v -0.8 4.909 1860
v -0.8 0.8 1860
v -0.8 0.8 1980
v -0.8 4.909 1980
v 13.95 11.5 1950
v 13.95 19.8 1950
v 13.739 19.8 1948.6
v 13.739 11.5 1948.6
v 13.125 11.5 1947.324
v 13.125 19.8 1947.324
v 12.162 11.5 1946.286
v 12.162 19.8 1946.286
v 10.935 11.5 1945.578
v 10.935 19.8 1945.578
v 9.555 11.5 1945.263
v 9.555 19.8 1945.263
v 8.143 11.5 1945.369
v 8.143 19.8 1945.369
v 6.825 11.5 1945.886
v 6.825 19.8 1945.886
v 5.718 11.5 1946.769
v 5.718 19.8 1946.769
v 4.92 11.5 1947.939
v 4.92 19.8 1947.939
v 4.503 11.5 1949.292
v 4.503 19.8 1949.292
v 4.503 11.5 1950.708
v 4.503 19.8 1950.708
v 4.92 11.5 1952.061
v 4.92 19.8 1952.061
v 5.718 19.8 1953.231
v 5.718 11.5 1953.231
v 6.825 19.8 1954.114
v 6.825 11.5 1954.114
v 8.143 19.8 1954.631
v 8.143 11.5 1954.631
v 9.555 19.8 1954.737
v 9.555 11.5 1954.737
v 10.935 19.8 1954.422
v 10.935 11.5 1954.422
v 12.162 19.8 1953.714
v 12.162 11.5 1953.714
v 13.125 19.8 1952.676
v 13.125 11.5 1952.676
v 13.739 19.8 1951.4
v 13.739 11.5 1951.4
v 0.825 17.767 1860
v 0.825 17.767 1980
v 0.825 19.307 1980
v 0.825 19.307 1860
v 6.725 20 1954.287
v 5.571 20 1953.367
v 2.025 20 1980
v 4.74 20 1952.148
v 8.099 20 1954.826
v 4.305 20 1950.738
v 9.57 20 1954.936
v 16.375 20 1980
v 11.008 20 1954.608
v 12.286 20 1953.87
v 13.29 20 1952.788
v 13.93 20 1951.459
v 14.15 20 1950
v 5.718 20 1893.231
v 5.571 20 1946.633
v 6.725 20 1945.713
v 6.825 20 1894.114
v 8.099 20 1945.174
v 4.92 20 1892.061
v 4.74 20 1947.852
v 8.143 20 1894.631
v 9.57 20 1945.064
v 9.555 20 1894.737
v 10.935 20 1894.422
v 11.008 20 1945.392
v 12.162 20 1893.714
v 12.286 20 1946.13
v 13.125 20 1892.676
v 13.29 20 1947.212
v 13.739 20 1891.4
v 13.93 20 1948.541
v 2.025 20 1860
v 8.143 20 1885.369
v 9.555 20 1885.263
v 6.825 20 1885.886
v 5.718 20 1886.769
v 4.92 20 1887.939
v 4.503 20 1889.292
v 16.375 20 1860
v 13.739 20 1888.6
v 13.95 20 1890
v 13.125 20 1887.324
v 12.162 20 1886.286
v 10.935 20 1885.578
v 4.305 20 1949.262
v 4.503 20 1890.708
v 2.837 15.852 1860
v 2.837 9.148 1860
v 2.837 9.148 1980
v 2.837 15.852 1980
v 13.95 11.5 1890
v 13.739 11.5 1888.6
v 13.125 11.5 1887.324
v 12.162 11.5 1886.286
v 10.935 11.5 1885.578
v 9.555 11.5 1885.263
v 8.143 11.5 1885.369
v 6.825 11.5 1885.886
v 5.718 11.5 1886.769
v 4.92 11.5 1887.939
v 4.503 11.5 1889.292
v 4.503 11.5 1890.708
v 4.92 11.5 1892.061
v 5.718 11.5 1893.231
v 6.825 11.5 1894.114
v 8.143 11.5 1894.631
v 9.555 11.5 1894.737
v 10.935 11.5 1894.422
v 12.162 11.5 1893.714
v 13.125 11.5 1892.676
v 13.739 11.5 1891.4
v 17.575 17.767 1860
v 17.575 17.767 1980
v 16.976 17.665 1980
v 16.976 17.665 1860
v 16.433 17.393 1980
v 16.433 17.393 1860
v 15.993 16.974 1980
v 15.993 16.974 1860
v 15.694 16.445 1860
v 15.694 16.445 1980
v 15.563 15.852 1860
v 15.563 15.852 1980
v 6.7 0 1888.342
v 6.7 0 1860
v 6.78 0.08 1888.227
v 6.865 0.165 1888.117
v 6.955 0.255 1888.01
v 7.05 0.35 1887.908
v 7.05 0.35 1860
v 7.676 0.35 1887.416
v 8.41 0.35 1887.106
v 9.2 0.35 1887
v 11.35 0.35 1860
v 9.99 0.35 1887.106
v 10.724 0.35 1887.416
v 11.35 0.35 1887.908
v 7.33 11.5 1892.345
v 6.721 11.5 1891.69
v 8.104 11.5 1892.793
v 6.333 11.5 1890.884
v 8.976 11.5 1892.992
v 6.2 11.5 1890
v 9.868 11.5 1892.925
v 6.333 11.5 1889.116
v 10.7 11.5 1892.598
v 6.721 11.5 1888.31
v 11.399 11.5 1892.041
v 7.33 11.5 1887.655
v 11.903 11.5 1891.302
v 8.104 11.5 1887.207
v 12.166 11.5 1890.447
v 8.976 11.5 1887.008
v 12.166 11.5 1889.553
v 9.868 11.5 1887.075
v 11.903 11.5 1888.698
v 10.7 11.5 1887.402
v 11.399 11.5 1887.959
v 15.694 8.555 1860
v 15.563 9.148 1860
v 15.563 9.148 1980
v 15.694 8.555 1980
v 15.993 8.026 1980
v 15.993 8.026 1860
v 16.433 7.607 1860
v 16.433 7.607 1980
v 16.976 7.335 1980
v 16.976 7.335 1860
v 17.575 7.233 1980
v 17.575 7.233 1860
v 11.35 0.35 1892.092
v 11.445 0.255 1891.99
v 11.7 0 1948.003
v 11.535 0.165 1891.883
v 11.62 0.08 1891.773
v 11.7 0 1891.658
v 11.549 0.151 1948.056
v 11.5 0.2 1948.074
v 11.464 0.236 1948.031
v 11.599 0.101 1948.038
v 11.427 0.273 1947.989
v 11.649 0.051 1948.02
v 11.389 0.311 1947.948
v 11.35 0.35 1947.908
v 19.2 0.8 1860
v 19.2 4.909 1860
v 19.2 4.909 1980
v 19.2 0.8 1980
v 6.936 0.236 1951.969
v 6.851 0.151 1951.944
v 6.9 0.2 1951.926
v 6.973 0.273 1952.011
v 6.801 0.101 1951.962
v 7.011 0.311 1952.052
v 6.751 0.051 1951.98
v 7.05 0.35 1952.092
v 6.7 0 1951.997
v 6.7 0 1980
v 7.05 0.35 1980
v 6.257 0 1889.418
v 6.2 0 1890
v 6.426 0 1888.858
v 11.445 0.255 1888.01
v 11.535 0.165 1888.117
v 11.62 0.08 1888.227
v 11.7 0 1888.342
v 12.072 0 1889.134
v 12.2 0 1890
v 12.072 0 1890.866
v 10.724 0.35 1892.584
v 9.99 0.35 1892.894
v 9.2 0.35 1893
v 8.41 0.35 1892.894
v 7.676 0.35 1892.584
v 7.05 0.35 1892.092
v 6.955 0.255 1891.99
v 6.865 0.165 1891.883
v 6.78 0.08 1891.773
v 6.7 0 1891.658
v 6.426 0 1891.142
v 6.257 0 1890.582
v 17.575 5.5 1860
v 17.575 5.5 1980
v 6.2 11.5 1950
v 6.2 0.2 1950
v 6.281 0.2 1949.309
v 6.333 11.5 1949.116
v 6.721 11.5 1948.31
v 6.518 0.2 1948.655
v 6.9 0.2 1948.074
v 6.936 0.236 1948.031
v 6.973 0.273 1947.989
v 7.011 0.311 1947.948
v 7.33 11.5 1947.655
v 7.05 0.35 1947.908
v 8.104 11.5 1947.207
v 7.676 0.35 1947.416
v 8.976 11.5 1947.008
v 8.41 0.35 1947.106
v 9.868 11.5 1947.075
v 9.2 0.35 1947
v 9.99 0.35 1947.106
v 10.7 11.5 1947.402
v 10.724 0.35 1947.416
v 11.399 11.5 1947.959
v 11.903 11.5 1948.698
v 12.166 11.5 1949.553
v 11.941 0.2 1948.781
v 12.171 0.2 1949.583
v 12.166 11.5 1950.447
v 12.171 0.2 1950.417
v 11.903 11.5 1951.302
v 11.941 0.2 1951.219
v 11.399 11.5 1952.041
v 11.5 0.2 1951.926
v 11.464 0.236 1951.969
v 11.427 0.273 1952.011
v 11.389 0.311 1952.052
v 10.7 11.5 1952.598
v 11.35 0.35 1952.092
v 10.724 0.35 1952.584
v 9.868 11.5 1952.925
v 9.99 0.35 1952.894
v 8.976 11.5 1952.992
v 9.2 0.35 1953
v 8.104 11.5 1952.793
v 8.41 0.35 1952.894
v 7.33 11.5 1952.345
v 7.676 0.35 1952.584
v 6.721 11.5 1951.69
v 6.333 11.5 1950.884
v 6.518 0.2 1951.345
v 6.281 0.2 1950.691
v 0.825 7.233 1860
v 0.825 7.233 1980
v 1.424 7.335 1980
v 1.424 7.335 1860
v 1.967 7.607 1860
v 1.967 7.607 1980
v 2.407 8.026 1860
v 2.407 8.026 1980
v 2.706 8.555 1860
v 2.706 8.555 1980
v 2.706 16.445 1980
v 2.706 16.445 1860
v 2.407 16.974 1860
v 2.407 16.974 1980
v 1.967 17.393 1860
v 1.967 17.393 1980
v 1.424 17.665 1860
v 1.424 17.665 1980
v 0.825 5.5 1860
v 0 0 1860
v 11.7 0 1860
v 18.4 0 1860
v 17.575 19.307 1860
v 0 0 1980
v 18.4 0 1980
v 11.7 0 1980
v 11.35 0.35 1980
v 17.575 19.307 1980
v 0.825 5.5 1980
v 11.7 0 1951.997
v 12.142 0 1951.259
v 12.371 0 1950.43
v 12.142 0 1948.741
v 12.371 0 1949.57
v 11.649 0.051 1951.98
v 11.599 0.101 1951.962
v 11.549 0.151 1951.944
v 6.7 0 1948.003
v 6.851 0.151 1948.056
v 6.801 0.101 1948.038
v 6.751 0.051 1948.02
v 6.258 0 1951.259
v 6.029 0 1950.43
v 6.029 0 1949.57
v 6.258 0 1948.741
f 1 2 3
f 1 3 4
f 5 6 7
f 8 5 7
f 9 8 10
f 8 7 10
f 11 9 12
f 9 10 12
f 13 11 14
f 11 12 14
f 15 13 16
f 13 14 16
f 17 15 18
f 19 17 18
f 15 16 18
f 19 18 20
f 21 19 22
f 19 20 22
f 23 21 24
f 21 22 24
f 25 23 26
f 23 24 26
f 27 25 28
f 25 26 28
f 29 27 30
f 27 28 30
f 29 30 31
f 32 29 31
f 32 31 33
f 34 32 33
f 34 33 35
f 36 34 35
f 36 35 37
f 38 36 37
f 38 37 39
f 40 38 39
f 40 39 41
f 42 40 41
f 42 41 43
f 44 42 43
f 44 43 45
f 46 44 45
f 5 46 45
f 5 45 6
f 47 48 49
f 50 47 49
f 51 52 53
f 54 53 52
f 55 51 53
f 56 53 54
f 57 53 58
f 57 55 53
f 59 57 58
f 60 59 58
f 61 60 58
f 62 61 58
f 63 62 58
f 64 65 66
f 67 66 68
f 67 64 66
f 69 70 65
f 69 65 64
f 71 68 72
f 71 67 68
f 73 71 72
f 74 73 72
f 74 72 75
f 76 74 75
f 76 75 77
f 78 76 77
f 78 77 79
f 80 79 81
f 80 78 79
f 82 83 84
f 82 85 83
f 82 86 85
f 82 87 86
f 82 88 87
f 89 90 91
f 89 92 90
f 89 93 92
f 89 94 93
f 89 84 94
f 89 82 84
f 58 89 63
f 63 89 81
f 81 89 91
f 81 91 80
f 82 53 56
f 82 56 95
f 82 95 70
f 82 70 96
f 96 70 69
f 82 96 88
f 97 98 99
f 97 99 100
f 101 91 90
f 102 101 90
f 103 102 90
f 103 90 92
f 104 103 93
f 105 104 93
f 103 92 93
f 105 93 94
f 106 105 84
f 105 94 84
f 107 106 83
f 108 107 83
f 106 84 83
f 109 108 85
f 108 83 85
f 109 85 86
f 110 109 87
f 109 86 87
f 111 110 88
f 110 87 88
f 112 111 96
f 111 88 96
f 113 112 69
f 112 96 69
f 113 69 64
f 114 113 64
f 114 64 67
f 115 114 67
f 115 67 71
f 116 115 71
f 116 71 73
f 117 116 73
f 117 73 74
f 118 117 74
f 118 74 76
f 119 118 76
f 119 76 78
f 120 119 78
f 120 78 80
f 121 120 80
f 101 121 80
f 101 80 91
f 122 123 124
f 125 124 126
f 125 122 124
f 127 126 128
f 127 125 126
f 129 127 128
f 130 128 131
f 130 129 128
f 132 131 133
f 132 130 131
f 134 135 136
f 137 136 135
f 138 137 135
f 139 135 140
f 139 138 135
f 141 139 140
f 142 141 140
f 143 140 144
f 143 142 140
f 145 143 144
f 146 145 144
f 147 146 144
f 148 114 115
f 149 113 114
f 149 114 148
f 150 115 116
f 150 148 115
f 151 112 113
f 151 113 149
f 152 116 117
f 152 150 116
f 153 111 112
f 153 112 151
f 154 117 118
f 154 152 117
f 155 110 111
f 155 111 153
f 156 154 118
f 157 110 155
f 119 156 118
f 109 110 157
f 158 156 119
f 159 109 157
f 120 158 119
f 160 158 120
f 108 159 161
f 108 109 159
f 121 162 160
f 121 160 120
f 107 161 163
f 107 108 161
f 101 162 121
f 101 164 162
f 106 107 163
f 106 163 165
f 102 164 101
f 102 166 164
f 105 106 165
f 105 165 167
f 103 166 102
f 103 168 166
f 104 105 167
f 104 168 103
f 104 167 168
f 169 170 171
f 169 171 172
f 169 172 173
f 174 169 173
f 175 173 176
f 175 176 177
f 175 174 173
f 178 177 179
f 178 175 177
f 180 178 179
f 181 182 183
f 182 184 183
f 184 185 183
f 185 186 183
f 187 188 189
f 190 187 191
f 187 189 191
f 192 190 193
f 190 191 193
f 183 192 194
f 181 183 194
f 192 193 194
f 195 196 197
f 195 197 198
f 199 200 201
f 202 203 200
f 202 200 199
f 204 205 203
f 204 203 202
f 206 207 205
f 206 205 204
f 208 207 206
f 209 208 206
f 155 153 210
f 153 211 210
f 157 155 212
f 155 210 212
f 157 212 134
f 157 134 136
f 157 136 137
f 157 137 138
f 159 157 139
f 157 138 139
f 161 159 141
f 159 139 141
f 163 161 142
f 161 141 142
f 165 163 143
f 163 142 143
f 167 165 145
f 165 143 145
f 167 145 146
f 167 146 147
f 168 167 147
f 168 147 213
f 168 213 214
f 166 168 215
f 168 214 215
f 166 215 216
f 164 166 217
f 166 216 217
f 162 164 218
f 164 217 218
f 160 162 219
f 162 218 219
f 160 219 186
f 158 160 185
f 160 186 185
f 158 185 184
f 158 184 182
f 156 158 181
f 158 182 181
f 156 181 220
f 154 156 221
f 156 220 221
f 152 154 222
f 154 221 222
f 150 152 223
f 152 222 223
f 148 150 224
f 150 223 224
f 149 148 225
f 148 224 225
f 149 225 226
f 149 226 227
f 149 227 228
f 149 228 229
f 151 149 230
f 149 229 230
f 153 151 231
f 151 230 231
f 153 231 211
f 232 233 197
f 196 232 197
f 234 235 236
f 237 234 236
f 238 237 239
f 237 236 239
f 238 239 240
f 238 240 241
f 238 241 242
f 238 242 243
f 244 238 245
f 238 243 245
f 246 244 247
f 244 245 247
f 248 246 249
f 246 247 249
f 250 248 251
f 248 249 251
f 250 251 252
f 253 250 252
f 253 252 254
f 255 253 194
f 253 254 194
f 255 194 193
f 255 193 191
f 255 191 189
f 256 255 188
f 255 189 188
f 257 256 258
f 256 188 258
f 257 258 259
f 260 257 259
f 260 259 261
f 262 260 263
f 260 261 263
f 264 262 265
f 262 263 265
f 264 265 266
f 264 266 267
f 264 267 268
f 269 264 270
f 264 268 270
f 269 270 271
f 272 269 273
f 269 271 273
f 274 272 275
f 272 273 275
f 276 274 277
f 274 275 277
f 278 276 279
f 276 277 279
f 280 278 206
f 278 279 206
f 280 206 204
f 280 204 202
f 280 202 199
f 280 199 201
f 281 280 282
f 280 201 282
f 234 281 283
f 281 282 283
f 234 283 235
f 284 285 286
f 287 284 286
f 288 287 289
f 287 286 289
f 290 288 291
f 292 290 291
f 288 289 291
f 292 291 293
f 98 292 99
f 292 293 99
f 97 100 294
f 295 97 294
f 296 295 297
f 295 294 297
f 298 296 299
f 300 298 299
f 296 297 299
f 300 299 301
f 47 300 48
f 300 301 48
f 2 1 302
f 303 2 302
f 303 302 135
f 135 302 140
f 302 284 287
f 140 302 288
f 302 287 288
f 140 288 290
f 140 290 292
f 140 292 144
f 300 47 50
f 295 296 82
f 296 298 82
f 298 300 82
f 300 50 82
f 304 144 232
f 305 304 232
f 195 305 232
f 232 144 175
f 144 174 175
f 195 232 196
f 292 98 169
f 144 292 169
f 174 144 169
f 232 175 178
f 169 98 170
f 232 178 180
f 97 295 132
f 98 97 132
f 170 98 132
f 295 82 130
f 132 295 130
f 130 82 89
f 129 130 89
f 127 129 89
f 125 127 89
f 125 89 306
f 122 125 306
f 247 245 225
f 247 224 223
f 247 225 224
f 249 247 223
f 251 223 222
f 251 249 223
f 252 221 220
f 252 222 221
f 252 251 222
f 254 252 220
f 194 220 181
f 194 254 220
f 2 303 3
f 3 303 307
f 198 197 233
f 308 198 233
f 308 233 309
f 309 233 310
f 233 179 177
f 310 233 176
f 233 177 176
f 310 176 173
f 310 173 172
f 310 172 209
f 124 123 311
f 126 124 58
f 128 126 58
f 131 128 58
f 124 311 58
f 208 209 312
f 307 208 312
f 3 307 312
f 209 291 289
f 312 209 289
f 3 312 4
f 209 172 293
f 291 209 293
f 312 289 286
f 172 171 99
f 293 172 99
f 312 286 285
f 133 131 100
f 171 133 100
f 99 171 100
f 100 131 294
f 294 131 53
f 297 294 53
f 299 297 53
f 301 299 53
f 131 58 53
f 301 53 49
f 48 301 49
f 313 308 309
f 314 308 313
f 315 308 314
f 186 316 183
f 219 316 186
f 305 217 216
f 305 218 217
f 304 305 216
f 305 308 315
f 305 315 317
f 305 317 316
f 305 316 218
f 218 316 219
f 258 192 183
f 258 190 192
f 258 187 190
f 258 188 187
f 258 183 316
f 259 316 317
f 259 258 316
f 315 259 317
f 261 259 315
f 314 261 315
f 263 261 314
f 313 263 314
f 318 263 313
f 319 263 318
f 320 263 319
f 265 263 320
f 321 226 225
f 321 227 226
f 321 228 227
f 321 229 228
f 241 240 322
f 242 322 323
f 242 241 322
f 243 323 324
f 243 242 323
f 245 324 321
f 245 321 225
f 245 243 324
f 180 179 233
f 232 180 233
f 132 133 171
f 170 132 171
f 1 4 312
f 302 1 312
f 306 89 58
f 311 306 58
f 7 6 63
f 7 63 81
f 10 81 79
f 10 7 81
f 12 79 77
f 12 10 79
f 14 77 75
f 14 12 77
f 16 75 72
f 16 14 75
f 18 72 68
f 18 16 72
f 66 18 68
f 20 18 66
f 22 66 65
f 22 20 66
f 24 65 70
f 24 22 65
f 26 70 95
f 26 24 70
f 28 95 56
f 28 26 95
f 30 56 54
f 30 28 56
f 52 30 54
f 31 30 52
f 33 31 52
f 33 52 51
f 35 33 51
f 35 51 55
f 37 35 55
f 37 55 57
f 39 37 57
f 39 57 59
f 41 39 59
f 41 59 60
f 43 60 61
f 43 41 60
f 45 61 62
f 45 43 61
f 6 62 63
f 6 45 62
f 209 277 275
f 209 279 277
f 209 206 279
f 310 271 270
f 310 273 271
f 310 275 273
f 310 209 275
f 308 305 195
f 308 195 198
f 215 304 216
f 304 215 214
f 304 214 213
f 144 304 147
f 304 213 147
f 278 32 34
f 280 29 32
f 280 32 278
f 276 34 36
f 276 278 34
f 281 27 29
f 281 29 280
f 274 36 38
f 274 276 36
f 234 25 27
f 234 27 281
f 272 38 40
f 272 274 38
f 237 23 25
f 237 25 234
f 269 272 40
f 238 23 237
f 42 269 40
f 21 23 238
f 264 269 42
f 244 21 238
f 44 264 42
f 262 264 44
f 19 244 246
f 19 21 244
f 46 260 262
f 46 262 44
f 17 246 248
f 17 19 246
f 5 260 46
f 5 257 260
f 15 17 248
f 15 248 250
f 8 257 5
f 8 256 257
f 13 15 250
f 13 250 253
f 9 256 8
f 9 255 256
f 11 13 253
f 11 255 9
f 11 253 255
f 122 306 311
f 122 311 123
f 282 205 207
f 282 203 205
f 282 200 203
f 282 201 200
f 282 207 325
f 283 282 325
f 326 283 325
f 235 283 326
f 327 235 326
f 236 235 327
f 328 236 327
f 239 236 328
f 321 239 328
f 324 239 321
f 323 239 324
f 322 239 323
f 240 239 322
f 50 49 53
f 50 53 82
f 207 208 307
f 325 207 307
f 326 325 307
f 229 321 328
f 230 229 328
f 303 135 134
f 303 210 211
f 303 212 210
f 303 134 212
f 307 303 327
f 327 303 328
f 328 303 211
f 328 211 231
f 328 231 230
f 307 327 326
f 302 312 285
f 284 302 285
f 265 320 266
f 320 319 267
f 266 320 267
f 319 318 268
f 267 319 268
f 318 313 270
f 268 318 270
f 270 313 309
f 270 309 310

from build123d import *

# Parameters (mm, degrees)
BOSS_EXTRU_1_DEPTH      = 1980
ENL_V_MAT_EXTRU_1_DEPTH = 1981.194091497
ESQUISSE3_W             = 4.3
ESQUISSE3_H             = 0.35
ENL_V_MAT_EXTRU_2_DEPTH = 1980
ESQUISSE4_W             = 1.625
ESQUISSE4_H             = 14.5
ENL_V_MAT_EXTRU_3_DEPTH = 1981.194091497
ENL_V_MAT_EXTRU_4_DEPTH = 1981.194091497
D_POUILLE1_ANGLE        = 20
D_POUILLE2_ANGLE        = 20
D_POUILLE3_ANGLE        = 45
PER_AGE1_D              = 6
PER_AGE1_DEPTH          = 20
PER_AGE1_CBORE_D        = 9.5
PER_AGE1_CBORE_DEPTH    = 8.5
CHANFREIN1_SIZE         = 0.8
CHANFREIN2_SIZE         = 1.2
CHANFREIN2_SIZE2        = 0.692820323
CHANFREIN3_SIZE         = 0.2
CHANFREIN4_SIZE         = 0.692820323
CHANFREIN4_SIZE2        = 1.2
ENL_V_START             = -120
ESQUISSE12_W            = 78.153878041
ESQUISSE12_H            = 74.514600195
ENL_V_MAT_EXTRU_5_DEPTH = 1861.194091497


with BuildPart() as part:
    # Esquisse1 → Boss.-Extru.1 (new body)
    with BuildSketch(Plane(origin=(0, 0, 0), x_dir=(-1, 0, 0), z_dir=(0, 0, -1))):
        with BuildLine():
            Line((-19.2, 7.973691854), (-19.2, 0))
            Line((-19.2, 0), (0.8, 0))
            Line((0.8, 0), (0.8, 20))
            Line((0.8, 20), (-17.575, 20))
            Line((-17.575, 20), (-17.575, 17.767136655))
            ThreePointArc((-17.575, 17.767136655), (-16.197491801, 17.200016465), (-15.5625262, 15.852436102))
            Line((-15.5625262, 15.852436102), (-15.5625262, 9.147563898))
            ThreePointArc((-15.5625262, 9.147563898), (-16.984759825, 7.331984363), (-19.2, 7.973691854))
        make_face()
    extrude(amount=-BOSS_EXTRU_1_DEPTH)

    # Esquisse2 → Enlèv. mat.-Extru.1 (cut, through all)
    with BuildSketch(Plane.XY.offset(1980)):
        with BuildLine():
            Line((17.575, 7.232863345), (17.575, 4.908548369))
            Line((17.575, 4.908548369), (19.2, 4.908548369))
            Line((19.2, 4.908548369), (19.2, 7.973691854))
            ThreePointArc((19.2, 7.973691854), (18.471955551, 7.418025184), (17.575, 7.232863345))
        make_face()
    extrude(amount=-ENL_V_MAT_EXTRU_1_DEPTH, mode=Mode.SUBTRACT)

    # Esquisse3 → Enlèv. mat.-Extru.2 (cut)
    with BuildSketch(Plane.XY.offset(1980)):
        with Locations((9.2, 0.175)):
            Rectangle(ESQUISSE3_W, ESQUISSE3_H)
    extrude(amount=-ENL_V_MAT_EXTRU_2_DEPTH, mode=Mode.SUBTRACT)

    # Esquisse4 → Enlèv. mat.-Extru.3 (cut, through all)
    with BuildSketch(Plane.XY.offset(1980)):
        with Locations((0.0125, 12.75)):
            Rectangle(ESQUISSE4_W, ESQUISSE4_H)
    extrude(amount=-ENL_V_MAT_EXTRU_3_DEPTH, mode=Mode.SUBTRACT)

    # Esquisse5 → Enlèv. mat.-Extru.4 (cut, through all)
    with BuildSketch(Plane.XY.offset(1980)):
        with BuildLine():
            Line((0.825, 17.767136655), (0.825, 7.232863345))
            ThreePointArc((0.825, 7.232863345), (2.202508199, 7.799983535), (2.8374738, 9.147563898))
            Line((2.8374738, 9.147563898), (2.8374738, 15.852436102))
            ThreePointArc((2.8374738, 15.852436102), (2.202508199, 17.200016465), (0.825, 17.767136655))
        make_face()
    extrude(amount=-ENL_V_MAT_EXTRU_4_DEPTH, mode=Mode.SUBTRACT)

    # Dépouille1
    d_pouille1_faces = [part.faces().sort_by_distance(p)[0] for p in [
        (0.0125, 5.5, 990),
    ]]
    draft(d_pouille1_faces, Plane(origin=(0.825, 5.5, 0), x_dir=(0, -1, 0), z_dir=(-1, 0, 0)), D_POUILLE1_ANGLE)

    # Dépouille2
    d_pouille2_faces = [part.faces().sort_by_distance(p)[0] for p in [
        (18.3875, 4.908548369, 990),
    ]]
    draft(d_pouille2_faces, Plane(origin=(19.2, 7.973691854, 1980), x_dir=(0, 0, 1), z_dir=(1, 0, 0)), D_POUILLE2_ANGLE)

    # Dépouille3
    d_pouille3_faces = [part.faces().sort_by_distance(p)[0] for p in [
        (11.35, 0.175, 990),
        (7.05, 0.175, 990),
    ]]
    draft(d_pouille3_faces, Plane(origin=(11.35, 0.35, 0), x_dir=(0, 0, -1), z_dir=(0, -1, 0)), D_POUILLE3_ANGLE)

    # Perçage1
    with Locations(Plane(origin=(0, 20, 0), x_dir=(1, 0, 0), z_dir=(0, 1, 0))):
        with Locations((9.2, -30), (9.2, -90), (9.2, -150), (9.2, -210), (9.2, -270), (9.2, -330), (9.2, -390), (9.2, -450), (9.2, -510), (9.2, -570), (9.2, -630), (9.2, -690), (9.2, -750), (9.2, -810), (9.2, -870), (9.2, -930), (9.2, -990), (9.2, -1050), (9.2, -1110), (9.2, -1170), (9.2, -1230), (9.2, -1290), (9.2, -1350), (9.2, -1410), (9.2, -1470), (9.2, -1530), (9.2, -1590), (9.2, -1650), (9.2, -1710), (9.2, -1770), (9.2, -1830), (9.2, -1890), (9.2, -1950)):
            CounterBoreHole(PER_AGE1_D / 2, PER_AGE1_CBORE_D / 2, PER_AGE1_CBORE_DEPTH, depth=PER_AGE1_DEPTH)

    # Chanfrein1
    chanfrein1_edges = [part.edges().sort_by_distance(p)[0] for p in [
        (-0.8, 0, 990),
        (19.2, 0, 990),
    ]]
    chamfer(chanfrein1_edges, length=CHANFREIN1_SIZE)

    # Chanfrein2
    chanfrein2_edges = [part.edges().sort_by_distance(p)[0] for p in [
        (0.825, 20, 990),
    ]]
    chanfrein2_side = [part.faces().sort_by_distance(p)[0] for p in [
        (9.2, 20, 19.800708478),
    ]]
    chamfer(chanfrein2_edges, length=CHANFREIN2_SIZE, length2=CHANFREIN2_SIZE2, reference=chanfrein2_side[0])

    # Chanfrein3
    chanfrein3_edges = [part.edges().sort_by_distance(p)[0] for p in [
        (12.2, 0, 1950),
        (6.327718677, 0, 1949.133974596),
        (4.45, 20, 1950),
    ]]
    chamfer(chanfrein3_edges, length=CHANFREIN3_SIZE)

    # Chanfrein4
    chanfrein4_edges = [part.edges().sort_by_distance(p)[0] for p in [
        (17.575, 20, 990),
    ]]
    chanfrein4_side = [part.faces().sort_by_distance(p)[0] for p in [
        (17.575, 18.883568328, 990),
    ]]
    chamfer(chanfrein4_edges, length=CHANFREIN4_SIZE, length2=CHANFREIN4_SIZE2, reference=chanfrein4_side[0])

    # Esquisse12 → Enlèv. mat.-Extru.5 (cut, through all)
    with BuildSketch(Plane.XY.offset(1980).offset(ENL_V_START)):
        with Locations((15.863080013, 8.671326529)):
            Rectangle(ESQUISSE12_W, ESQUISSE12_H)
    extrude(amount=-ENL_V_MAT_EXTRU_5_DEPTH, mode=Mode.SUBTRACT)


solid = part.part
